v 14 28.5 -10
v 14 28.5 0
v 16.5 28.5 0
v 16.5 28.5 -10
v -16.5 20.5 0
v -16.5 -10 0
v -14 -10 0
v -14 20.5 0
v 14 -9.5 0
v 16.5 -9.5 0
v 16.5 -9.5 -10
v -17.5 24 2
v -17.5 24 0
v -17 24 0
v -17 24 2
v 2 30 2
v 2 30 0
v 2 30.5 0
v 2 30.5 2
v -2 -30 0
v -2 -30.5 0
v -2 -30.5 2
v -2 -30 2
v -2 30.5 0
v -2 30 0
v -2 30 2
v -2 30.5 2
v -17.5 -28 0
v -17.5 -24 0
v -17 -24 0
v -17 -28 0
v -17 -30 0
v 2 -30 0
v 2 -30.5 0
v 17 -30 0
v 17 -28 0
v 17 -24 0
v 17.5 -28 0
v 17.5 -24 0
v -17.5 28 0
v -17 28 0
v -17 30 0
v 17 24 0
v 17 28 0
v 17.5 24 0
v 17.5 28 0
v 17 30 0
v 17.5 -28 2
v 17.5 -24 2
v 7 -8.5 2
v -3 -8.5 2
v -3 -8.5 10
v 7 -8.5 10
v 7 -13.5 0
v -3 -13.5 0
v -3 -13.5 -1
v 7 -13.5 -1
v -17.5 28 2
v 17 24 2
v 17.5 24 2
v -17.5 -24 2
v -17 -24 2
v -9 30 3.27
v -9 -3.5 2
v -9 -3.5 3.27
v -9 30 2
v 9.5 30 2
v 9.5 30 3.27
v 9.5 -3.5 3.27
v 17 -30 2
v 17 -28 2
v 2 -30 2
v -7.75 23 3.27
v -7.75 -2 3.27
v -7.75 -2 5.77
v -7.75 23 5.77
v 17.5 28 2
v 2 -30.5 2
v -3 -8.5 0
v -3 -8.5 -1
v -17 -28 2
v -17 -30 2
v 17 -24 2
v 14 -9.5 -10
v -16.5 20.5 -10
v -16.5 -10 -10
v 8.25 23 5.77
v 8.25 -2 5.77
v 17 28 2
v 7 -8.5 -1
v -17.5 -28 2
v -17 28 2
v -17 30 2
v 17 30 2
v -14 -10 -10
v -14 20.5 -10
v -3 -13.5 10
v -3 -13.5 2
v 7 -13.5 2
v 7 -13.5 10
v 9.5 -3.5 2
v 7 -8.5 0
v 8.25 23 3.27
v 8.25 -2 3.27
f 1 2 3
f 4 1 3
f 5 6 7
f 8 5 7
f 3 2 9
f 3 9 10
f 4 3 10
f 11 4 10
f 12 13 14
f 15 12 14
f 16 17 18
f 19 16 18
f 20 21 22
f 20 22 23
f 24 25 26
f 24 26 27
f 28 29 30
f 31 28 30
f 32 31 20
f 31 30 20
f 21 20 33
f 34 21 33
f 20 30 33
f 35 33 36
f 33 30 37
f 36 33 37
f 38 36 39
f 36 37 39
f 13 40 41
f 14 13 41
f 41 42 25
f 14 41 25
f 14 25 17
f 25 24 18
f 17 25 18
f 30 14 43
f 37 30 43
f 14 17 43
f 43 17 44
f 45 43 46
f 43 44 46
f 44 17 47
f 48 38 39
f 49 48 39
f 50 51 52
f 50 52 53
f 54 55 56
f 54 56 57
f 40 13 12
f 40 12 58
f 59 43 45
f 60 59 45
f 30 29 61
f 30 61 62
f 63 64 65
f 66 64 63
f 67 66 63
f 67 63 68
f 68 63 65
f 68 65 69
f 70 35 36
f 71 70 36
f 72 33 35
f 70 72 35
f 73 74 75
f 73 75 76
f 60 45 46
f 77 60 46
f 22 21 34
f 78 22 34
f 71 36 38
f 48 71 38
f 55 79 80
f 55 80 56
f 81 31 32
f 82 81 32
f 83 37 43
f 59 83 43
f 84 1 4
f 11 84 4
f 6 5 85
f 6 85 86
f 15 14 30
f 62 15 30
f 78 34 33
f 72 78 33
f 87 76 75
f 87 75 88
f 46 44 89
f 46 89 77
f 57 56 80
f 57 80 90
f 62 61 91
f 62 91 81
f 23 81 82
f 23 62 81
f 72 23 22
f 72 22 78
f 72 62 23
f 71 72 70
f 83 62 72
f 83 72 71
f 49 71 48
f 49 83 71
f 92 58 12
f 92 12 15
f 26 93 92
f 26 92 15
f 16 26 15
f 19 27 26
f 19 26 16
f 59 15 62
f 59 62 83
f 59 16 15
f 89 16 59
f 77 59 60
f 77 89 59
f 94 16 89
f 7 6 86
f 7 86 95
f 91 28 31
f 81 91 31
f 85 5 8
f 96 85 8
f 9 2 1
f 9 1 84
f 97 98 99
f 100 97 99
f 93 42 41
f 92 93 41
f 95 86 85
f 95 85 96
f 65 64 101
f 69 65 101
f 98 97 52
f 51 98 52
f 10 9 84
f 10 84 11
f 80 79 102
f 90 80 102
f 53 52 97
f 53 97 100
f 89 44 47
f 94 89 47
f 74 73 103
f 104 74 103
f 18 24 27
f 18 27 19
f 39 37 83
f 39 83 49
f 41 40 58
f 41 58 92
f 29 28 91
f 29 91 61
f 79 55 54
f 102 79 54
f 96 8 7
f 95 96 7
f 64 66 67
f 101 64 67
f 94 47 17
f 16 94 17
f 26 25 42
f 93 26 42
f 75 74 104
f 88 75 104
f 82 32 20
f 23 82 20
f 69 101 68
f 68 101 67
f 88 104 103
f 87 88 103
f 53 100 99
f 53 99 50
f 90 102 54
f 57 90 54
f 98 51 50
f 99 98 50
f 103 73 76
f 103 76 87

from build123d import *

# Parameters (mm, degrees)
F0_W      = 4
F0_H      = 0.5
F0_W_2    = 0.5
F0_H_2    = 4
F1_DEPTH  = 2
F2_W      = 18.5
F2_H      = 33.5
F3_DEPTH  = 1.27
F4_W      = 16
F4_H      = 25
F5_DEPTH  = 2.5
F6_W      = 10
F6_H      = 5
F7_DEPTH  = 8
F8_W      = 10
F8_H      = 5
F9_DEPTH  = 1
F10_W     = 2.5
F10_H     = 30.5
F10_H_2   = 38
F11_DEPTH = 10


with BuildPart() as f1:
    # F0 (on Top) → F1 (new body)
    with BuildSketch(Plane.XY):
        Polygon((2, -30), (17, -30), (17, -28), (17, -24), (17, 24), (17, 28), (17, 30), (2, 30), (-2, 30), (-17, 30), (-17, 28), (-17, 24), (-17, -24), (-17, -28), (-17, -30), (-2, -30), align=None)
        with Locations((0, -30.25)):
            Rectangle(F0_W, F0_H)
        with Locations((17.25, -26)):
            Rectangle(F0_W_2, F0_H_2)
        with Locations((17.25, 26)):
            Rectangle(F0_W_2, F0_H_2)
        with Locations((-17.25, -26)):
            Rectangle(F0_W_2, F0_H_2)
        with Locations((-17.25, 26)):
            Rectangle(F0_W_2, F0_H_2)
        with Locations((0, 30.25)):
            Rectangle(F0_W, F0_H)
    extrude(amount=F1_DEPTH)


with BuildPart() as f3:
    # F2 (on face) → F3 (new body)
    with BuildSketch(Plane.XY.offset(2)):
        with Locations((0.25, 13.25)):
            Rectangle(F2_W, F2_H)
    extrude(amount=F3_DEPTH)


with BuildPart() as f5:
    # F4 (on face) → F5 (new body)
    with BuildSketch(Plane.XY.offset(3.27)):
        with Locations((0.25, 10.5)):
            Rectangle(F4_W, F4_H)
    extrude(amount=F5_DEPTH)


with BuildPart() as f7:
    # F6 (on face) → F7 (new body)
    with BuildSketch(Plane.XY.offset(2)):
        with Locations((2, -11)):
            Rectangle(F6_W, F6_H)
    extrude(amount=F7_DEPTH)


with BuildPart() as f9:
    # F8 (on face) → F9 (new body)
    with BuildSketch(Plane(origin=(0, 0, 0), x_dir=(1, 0, 0), z_dir=(0, 0, -1))):
        with Locations((2, 11)):
            Rectangle(F8_W, F8_H)
    extrude(amount=F9_DEPTH)


with BuildPart() as f11:
    # F10 (on face) → F11 (new body)
    with BuildSketch(Plane(origin=(0, 0, 0), x_dir=(1, 0, 0), z_dir=(0, 0, -1))):
        with Locations((-15.25, -5.25)):
            Rectangle(F10_W, F10_H)
        with Locations((15.25, -9.5)):
            Rectangle(F10_W, F10_H_2)
    extrude(amount=F11_DEPTH)


solid = Compound([f1.part, f3.part, f5.part, f7.part, f9.part, f11.part])
